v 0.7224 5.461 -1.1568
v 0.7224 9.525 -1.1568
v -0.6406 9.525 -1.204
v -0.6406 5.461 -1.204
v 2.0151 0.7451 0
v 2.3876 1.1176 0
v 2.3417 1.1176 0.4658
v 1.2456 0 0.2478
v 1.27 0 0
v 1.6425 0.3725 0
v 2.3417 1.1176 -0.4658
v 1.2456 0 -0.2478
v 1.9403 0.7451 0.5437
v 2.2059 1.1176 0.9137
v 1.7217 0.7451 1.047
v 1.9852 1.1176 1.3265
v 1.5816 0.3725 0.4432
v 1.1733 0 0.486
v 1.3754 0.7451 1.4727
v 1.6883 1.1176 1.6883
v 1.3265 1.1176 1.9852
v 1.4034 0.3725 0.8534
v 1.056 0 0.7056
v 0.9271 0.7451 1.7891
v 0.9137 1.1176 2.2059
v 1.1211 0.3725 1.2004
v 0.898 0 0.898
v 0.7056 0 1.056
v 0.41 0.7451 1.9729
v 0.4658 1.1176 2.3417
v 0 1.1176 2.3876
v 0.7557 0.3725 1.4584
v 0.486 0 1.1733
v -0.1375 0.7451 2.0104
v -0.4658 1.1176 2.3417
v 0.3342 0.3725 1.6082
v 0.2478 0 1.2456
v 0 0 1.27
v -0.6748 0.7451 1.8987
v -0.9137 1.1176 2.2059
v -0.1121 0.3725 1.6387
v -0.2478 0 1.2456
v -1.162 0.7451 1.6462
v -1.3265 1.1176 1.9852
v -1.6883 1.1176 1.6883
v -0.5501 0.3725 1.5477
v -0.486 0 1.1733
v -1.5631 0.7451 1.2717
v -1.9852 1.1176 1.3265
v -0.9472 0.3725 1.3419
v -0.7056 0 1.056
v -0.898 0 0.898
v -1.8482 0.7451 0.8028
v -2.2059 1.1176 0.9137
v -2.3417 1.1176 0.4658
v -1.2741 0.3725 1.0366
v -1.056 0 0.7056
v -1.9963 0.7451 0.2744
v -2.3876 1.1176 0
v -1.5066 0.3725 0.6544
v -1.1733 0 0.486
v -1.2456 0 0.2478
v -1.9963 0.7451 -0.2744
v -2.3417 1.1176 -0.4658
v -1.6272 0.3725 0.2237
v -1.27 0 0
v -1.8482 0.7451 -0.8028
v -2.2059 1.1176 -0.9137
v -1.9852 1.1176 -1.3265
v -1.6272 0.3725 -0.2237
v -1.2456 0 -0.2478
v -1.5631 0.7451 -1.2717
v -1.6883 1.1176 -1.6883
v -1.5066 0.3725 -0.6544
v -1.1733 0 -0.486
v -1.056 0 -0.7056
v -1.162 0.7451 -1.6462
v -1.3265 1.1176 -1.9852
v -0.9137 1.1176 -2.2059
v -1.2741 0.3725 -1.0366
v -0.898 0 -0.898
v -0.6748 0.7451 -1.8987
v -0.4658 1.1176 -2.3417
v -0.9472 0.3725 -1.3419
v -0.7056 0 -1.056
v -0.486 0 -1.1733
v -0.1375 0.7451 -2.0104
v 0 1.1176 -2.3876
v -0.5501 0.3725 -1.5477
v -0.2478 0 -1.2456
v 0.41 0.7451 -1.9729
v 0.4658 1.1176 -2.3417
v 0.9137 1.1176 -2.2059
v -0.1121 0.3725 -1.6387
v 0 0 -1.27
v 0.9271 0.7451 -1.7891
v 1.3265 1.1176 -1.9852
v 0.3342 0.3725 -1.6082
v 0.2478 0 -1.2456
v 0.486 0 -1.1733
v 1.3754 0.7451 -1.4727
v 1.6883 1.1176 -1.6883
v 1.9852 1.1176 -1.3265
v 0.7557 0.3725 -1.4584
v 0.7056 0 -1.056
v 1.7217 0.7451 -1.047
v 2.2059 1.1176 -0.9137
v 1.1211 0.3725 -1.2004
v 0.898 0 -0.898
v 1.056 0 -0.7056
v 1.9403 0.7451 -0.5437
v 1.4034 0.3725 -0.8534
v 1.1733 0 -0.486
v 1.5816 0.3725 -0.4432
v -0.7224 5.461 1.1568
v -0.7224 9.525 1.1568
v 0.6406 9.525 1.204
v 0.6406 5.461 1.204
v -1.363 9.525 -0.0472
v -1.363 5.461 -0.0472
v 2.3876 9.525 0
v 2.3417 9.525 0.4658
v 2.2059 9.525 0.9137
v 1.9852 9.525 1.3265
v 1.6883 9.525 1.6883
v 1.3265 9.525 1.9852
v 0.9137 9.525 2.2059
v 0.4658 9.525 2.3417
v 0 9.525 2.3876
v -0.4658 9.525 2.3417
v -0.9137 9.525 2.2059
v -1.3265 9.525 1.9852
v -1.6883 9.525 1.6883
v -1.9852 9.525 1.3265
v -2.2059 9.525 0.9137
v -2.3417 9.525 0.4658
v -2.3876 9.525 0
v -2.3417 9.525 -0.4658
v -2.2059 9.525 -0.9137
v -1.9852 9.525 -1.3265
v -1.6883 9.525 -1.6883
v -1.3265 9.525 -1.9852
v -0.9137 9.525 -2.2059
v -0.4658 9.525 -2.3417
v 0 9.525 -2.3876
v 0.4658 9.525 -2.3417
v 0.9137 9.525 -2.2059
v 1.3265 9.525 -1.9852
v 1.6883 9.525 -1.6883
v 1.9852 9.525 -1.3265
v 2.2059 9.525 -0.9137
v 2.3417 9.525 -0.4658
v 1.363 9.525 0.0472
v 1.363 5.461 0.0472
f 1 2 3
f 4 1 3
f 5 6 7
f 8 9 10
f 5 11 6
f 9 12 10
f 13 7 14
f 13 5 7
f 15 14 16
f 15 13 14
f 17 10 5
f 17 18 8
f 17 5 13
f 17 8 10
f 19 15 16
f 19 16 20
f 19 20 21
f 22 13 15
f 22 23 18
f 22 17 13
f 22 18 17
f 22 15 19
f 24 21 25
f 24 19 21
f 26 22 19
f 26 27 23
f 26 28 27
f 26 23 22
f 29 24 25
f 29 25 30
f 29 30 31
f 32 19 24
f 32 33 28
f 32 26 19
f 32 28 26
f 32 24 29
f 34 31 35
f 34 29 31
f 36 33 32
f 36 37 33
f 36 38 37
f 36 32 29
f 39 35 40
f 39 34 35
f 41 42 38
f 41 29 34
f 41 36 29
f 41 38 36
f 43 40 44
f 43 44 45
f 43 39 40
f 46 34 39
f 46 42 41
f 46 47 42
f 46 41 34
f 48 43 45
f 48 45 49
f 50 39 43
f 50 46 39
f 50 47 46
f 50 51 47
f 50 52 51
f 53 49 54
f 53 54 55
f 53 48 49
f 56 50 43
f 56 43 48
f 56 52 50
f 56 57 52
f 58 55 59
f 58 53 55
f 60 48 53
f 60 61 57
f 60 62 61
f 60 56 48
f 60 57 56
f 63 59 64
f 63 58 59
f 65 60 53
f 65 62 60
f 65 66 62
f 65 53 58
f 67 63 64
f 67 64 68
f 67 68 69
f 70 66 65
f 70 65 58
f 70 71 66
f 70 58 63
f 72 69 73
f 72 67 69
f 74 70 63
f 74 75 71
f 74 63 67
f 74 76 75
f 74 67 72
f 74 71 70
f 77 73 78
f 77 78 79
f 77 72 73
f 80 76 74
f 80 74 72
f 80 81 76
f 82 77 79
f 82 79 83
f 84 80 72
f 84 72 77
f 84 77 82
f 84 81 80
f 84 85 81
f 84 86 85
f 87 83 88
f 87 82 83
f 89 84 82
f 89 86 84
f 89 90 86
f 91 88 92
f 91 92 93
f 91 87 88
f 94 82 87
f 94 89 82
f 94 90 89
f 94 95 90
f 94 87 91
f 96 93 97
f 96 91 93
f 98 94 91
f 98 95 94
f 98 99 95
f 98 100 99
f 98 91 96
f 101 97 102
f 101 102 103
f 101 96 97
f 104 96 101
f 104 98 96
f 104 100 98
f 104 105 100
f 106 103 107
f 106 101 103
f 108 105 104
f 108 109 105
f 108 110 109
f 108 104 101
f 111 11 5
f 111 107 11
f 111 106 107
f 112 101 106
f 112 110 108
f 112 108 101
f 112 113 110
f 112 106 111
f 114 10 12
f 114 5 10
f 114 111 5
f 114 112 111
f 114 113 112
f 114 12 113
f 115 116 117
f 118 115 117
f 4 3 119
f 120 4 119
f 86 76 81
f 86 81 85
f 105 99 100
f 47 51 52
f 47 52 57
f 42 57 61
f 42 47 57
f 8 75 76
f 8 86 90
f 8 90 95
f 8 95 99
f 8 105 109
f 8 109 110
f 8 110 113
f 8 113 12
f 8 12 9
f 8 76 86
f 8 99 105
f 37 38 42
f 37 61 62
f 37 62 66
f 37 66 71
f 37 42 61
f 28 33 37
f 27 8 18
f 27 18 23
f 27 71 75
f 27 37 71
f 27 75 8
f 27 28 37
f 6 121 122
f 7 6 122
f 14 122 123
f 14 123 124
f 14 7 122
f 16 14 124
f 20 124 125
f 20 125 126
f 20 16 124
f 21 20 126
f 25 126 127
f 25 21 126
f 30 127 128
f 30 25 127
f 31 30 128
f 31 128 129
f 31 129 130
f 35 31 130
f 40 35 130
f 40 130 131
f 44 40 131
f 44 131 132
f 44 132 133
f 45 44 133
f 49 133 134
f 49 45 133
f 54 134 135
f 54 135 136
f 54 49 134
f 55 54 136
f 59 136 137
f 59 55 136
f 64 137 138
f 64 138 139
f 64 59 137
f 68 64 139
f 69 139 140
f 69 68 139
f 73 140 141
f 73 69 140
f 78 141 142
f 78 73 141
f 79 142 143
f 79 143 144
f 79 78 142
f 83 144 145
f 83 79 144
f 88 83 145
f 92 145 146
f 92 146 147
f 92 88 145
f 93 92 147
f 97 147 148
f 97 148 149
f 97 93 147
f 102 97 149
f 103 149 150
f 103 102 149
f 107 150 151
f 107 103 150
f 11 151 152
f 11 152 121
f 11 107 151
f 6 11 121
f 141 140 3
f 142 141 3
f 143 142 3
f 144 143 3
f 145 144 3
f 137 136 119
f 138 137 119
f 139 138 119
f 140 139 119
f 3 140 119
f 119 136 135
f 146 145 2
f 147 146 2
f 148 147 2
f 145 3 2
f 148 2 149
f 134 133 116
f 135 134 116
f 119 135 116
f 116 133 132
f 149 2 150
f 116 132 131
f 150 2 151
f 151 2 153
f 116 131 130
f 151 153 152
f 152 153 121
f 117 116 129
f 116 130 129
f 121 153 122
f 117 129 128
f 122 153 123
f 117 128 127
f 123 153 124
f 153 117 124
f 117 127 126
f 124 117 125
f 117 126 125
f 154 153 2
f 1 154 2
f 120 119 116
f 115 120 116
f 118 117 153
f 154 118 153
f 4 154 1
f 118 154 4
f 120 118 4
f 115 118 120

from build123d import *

# Parameters (mm, degrees)
F0_R     = 2.3876
F1_DEPTH = 9.525
F3_DEPTH = 4.064
F4_SIZE  = 1.1176


with BuildPart() as f1:
    # F0 (on Front) → F1 (new body)
    with BuildSketch(Plane.XZ):
        Circle(F0_R)
    extrude(amount=-F1_DEPTH)

    # F2 (on face) → F3 (cut)
    with BuildSketch(Plane(origin=(0, 9.525, 0), x_dir=(-1, 0, 0), z_dir=(0, 1, 0))):
        Polygon((-1.363001, 0.047171), (-0.722352, -1.156808), (0.640649, -1.203979), (1.363001, -0.047171), (0.722352, 1.156808), (-0.640649, 1.203979), align=None)
    extrude(amount=-F3_DEPTH, mode=Mode.SUBTRACT)

    # F4
    f4_edges = [f1.edges().sort_by_distance(p)[0] for p in [
        (-2.3876, 0, 0),
    ]]
    chamfer(f4_edges, length=F4_SIZE)


solid = f1.part
